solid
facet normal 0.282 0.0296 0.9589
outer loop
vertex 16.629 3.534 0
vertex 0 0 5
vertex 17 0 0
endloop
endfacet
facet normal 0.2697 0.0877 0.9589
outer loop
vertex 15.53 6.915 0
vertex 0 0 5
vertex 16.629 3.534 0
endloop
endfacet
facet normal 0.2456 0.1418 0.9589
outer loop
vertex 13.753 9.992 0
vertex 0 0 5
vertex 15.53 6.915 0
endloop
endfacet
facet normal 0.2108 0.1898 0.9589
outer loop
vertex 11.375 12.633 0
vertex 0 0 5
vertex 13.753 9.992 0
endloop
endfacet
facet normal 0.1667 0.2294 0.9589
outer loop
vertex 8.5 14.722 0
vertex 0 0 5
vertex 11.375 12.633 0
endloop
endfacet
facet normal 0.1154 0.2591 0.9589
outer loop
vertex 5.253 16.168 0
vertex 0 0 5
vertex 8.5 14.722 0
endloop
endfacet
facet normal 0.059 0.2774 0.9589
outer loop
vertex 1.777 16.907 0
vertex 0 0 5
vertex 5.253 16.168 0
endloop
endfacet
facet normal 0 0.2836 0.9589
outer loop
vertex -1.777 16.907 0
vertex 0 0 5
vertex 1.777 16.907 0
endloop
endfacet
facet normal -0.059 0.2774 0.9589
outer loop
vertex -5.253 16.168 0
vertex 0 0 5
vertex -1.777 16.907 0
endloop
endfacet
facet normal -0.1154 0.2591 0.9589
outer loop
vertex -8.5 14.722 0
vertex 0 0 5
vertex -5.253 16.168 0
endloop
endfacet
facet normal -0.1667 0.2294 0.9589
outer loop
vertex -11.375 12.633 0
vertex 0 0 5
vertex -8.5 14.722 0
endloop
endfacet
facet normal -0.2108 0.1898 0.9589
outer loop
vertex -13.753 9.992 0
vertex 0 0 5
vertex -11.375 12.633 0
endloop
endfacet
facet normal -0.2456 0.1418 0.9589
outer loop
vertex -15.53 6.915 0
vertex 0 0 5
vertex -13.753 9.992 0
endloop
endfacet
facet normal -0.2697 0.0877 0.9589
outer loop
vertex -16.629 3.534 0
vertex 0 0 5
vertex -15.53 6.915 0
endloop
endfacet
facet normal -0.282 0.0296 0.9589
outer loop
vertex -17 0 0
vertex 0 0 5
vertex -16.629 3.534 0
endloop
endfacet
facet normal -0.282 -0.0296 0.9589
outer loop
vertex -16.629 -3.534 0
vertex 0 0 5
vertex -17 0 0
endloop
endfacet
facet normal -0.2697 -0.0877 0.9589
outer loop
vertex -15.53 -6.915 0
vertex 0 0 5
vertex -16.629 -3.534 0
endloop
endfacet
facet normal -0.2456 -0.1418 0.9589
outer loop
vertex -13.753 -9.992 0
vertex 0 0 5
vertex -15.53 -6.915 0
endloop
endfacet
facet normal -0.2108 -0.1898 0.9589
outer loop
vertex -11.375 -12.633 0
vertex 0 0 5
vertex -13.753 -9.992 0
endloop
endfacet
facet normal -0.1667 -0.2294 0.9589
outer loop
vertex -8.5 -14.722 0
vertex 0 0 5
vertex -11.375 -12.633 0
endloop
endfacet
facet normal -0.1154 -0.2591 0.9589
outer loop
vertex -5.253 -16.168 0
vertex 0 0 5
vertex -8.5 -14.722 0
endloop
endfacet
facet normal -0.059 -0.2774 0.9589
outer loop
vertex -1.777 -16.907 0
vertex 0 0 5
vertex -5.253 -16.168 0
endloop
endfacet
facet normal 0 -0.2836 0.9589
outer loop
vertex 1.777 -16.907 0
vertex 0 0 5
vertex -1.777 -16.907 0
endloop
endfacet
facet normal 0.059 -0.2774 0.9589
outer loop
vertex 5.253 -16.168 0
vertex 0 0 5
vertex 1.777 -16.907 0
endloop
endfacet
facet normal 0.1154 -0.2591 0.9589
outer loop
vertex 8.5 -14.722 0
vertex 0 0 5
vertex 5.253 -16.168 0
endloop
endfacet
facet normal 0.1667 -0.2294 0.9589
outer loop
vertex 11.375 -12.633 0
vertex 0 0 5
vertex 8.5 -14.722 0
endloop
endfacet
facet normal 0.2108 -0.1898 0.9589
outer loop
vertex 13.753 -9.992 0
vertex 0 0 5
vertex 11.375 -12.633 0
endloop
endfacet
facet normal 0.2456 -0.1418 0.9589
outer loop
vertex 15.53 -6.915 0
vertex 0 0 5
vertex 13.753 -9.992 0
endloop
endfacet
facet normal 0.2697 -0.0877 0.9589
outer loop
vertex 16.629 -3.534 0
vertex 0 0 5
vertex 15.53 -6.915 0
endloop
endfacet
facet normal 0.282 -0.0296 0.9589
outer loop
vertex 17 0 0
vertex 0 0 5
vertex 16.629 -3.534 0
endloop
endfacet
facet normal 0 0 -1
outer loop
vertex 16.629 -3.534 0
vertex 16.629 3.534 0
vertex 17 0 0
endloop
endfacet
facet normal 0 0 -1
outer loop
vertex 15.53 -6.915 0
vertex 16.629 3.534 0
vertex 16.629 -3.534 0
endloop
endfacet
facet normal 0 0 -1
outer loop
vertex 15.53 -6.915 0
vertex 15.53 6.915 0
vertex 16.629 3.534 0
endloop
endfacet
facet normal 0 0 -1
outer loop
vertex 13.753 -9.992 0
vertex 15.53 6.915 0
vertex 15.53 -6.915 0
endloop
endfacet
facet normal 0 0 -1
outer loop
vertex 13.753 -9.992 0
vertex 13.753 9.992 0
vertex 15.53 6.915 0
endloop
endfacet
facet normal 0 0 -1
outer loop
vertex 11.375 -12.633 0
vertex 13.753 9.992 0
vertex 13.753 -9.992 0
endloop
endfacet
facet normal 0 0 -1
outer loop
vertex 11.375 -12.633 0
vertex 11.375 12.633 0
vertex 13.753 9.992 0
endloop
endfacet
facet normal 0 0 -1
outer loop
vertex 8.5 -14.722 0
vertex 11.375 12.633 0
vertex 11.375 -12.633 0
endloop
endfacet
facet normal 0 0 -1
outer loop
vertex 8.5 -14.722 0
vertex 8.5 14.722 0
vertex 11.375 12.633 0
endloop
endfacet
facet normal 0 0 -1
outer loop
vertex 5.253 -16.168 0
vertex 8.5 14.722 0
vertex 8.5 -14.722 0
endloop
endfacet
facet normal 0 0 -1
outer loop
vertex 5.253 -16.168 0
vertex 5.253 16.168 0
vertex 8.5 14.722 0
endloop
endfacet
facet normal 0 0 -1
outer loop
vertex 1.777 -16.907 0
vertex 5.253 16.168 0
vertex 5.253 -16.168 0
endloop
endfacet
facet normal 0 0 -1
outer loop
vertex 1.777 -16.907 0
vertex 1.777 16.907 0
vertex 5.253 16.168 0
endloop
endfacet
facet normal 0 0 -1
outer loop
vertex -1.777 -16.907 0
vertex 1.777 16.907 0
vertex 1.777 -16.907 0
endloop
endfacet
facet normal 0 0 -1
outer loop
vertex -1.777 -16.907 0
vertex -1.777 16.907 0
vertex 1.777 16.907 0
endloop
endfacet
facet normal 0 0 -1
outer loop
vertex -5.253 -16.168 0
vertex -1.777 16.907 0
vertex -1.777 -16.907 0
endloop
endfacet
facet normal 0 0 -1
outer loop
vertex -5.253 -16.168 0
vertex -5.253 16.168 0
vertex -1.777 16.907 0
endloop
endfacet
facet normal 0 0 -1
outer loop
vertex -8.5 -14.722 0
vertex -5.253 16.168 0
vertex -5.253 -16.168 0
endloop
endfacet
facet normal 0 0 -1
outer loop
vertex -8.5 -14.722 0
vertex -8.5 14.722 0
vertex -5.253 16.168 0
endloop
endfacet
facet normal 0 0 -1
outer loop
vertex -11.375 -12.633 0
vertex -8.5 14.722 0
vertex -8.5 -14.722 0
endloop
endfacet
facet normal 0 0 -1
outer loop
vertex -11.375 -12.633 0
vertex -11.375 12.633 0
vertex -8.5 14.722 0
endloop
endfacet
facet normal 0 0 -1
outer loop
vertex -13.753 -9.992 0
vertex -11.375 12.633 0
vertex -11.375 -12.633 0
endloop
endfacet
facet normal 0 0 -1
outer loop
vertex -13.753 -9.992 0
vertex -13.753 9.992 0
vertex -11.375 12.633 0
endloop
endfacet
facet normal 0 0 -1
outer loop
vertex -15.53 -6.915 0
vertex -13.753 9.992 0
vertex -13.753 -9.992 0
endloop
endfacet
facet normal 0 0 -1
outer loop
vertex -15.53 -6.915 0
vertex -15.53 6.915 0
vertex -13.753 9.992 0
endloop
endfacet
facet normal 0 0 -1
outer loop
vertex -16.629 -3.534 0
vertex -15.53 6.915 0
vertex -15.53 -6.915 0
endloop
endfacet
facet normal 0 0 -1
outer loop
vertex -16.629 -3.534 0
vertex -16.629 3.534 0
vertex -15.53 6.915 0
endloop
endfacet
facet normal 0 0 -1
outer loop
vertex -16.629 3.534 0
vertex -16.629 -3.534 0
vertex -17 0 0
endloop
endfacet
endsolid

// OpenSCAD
// Generated by SolidPython 1.0.1 on 2020-07-29 00:46:43


cylinder(h = 5, r1 = 17, r2 = 0);
/***********************************************
*********      SolidPython code:      **********
************************************************
 
# import packages: SolidPython
from solid import *
from solid.utils import *
from itertools import chain, combinations, permutations


class Resize:

    def __init__(self, scad_file):
        self.scad_file = scad_file
        #self.scad_file = import_scad(scad_file)
        # cone/cylinder param:
        self.r1 = 0
        self.r2 = 0
        self.h = 0
        # rectangular prism param:
        self.w = 0
        self.l = 0
        # ellipse param:
        self.r = 0

    # import OpenScad code (file name corresponds to shape)


    # classify shape + parameters
    def assign(self, param1, param2, param3):
        if self.scad_file == 'cone.scad':
            self.r1 = param1
            self.r2 = param2
            self.h = param3
        elif self.scad_file == 'cylinder.scad':
            self.r1 = param1
            self.r2 = param2
            self.h = param3
        elif self.scad_file == 'rectangularPrism.scad':
            self.h = param1
            self.l = param2
            self.w = param3
        else:
            self.r = param1
            self.h = param2

    # resize parameters
    def iterate(self):
        x = range(3, 20, 2)
        i = 1
        if self.scad_file == 'cone.scad':
            tempList = list(permutations(x, 2))
            for temp in tempList:
                param1 = temp[0]
                param2 = temp[1]
                filepath = 'produced_scad_files/' + 'cone' + str(param1) + '_' + str(param2) + '_' + '.scad'
                scad_render_to_file(cylinder(h=param1, r1=param2, r2=0), filepath)

        elif self.scad_file == 'cylinder.scad':
            tempList = list(permutations(x, 3))
            for temp in tempList:
                param1 = temp[0]
                param2 = temp[1]
                filepath = 'produced_scad_files/' + 'cylinder' + str(param1) + '_' + str(param2) + '_' + '.scad'
                scad_render_to_file(cylinder(h=param1, r1=param2, r2=param2), filepath)

        elif self.scad_file == 'rectangularPrism.scad':
            tempList = list(permutations(x, 3))
            for temp in tempList:
                param1 = temp[0]
                param2 = temp[1]
                param3 = temp[2]
                filepath = 'produced_scad_files/' + 'rectangularPrism' + str(param1) + '_' + str(param2) + '_' + str(
                    param3) + '.scad'
                scad_render_to_file(cube(size=(param1, param2, param3)), filepath)

        elif self.scad_file == 'ellipse.scad':
            tempList = list(permutations(x, 4))
            for temp in tempList:
                param1 = temp[0]
                param2 = temp[1]
                param3 = temp[2]
                param4 = temp[3]
                filepath = 'produced_scad_files/' + 'ellipse' + str(param1) + '_' + str(param2) + '_' + str(param3) + '_' + str(param4) + '.scad'
                scad_render_to_file(scale([param1, param2, param3])(sphere(r=param4)), filepath)

    def render_to_scadfile(self):
        scad_render_to_file(scad, 'example.scad') 
 
************************************************/
